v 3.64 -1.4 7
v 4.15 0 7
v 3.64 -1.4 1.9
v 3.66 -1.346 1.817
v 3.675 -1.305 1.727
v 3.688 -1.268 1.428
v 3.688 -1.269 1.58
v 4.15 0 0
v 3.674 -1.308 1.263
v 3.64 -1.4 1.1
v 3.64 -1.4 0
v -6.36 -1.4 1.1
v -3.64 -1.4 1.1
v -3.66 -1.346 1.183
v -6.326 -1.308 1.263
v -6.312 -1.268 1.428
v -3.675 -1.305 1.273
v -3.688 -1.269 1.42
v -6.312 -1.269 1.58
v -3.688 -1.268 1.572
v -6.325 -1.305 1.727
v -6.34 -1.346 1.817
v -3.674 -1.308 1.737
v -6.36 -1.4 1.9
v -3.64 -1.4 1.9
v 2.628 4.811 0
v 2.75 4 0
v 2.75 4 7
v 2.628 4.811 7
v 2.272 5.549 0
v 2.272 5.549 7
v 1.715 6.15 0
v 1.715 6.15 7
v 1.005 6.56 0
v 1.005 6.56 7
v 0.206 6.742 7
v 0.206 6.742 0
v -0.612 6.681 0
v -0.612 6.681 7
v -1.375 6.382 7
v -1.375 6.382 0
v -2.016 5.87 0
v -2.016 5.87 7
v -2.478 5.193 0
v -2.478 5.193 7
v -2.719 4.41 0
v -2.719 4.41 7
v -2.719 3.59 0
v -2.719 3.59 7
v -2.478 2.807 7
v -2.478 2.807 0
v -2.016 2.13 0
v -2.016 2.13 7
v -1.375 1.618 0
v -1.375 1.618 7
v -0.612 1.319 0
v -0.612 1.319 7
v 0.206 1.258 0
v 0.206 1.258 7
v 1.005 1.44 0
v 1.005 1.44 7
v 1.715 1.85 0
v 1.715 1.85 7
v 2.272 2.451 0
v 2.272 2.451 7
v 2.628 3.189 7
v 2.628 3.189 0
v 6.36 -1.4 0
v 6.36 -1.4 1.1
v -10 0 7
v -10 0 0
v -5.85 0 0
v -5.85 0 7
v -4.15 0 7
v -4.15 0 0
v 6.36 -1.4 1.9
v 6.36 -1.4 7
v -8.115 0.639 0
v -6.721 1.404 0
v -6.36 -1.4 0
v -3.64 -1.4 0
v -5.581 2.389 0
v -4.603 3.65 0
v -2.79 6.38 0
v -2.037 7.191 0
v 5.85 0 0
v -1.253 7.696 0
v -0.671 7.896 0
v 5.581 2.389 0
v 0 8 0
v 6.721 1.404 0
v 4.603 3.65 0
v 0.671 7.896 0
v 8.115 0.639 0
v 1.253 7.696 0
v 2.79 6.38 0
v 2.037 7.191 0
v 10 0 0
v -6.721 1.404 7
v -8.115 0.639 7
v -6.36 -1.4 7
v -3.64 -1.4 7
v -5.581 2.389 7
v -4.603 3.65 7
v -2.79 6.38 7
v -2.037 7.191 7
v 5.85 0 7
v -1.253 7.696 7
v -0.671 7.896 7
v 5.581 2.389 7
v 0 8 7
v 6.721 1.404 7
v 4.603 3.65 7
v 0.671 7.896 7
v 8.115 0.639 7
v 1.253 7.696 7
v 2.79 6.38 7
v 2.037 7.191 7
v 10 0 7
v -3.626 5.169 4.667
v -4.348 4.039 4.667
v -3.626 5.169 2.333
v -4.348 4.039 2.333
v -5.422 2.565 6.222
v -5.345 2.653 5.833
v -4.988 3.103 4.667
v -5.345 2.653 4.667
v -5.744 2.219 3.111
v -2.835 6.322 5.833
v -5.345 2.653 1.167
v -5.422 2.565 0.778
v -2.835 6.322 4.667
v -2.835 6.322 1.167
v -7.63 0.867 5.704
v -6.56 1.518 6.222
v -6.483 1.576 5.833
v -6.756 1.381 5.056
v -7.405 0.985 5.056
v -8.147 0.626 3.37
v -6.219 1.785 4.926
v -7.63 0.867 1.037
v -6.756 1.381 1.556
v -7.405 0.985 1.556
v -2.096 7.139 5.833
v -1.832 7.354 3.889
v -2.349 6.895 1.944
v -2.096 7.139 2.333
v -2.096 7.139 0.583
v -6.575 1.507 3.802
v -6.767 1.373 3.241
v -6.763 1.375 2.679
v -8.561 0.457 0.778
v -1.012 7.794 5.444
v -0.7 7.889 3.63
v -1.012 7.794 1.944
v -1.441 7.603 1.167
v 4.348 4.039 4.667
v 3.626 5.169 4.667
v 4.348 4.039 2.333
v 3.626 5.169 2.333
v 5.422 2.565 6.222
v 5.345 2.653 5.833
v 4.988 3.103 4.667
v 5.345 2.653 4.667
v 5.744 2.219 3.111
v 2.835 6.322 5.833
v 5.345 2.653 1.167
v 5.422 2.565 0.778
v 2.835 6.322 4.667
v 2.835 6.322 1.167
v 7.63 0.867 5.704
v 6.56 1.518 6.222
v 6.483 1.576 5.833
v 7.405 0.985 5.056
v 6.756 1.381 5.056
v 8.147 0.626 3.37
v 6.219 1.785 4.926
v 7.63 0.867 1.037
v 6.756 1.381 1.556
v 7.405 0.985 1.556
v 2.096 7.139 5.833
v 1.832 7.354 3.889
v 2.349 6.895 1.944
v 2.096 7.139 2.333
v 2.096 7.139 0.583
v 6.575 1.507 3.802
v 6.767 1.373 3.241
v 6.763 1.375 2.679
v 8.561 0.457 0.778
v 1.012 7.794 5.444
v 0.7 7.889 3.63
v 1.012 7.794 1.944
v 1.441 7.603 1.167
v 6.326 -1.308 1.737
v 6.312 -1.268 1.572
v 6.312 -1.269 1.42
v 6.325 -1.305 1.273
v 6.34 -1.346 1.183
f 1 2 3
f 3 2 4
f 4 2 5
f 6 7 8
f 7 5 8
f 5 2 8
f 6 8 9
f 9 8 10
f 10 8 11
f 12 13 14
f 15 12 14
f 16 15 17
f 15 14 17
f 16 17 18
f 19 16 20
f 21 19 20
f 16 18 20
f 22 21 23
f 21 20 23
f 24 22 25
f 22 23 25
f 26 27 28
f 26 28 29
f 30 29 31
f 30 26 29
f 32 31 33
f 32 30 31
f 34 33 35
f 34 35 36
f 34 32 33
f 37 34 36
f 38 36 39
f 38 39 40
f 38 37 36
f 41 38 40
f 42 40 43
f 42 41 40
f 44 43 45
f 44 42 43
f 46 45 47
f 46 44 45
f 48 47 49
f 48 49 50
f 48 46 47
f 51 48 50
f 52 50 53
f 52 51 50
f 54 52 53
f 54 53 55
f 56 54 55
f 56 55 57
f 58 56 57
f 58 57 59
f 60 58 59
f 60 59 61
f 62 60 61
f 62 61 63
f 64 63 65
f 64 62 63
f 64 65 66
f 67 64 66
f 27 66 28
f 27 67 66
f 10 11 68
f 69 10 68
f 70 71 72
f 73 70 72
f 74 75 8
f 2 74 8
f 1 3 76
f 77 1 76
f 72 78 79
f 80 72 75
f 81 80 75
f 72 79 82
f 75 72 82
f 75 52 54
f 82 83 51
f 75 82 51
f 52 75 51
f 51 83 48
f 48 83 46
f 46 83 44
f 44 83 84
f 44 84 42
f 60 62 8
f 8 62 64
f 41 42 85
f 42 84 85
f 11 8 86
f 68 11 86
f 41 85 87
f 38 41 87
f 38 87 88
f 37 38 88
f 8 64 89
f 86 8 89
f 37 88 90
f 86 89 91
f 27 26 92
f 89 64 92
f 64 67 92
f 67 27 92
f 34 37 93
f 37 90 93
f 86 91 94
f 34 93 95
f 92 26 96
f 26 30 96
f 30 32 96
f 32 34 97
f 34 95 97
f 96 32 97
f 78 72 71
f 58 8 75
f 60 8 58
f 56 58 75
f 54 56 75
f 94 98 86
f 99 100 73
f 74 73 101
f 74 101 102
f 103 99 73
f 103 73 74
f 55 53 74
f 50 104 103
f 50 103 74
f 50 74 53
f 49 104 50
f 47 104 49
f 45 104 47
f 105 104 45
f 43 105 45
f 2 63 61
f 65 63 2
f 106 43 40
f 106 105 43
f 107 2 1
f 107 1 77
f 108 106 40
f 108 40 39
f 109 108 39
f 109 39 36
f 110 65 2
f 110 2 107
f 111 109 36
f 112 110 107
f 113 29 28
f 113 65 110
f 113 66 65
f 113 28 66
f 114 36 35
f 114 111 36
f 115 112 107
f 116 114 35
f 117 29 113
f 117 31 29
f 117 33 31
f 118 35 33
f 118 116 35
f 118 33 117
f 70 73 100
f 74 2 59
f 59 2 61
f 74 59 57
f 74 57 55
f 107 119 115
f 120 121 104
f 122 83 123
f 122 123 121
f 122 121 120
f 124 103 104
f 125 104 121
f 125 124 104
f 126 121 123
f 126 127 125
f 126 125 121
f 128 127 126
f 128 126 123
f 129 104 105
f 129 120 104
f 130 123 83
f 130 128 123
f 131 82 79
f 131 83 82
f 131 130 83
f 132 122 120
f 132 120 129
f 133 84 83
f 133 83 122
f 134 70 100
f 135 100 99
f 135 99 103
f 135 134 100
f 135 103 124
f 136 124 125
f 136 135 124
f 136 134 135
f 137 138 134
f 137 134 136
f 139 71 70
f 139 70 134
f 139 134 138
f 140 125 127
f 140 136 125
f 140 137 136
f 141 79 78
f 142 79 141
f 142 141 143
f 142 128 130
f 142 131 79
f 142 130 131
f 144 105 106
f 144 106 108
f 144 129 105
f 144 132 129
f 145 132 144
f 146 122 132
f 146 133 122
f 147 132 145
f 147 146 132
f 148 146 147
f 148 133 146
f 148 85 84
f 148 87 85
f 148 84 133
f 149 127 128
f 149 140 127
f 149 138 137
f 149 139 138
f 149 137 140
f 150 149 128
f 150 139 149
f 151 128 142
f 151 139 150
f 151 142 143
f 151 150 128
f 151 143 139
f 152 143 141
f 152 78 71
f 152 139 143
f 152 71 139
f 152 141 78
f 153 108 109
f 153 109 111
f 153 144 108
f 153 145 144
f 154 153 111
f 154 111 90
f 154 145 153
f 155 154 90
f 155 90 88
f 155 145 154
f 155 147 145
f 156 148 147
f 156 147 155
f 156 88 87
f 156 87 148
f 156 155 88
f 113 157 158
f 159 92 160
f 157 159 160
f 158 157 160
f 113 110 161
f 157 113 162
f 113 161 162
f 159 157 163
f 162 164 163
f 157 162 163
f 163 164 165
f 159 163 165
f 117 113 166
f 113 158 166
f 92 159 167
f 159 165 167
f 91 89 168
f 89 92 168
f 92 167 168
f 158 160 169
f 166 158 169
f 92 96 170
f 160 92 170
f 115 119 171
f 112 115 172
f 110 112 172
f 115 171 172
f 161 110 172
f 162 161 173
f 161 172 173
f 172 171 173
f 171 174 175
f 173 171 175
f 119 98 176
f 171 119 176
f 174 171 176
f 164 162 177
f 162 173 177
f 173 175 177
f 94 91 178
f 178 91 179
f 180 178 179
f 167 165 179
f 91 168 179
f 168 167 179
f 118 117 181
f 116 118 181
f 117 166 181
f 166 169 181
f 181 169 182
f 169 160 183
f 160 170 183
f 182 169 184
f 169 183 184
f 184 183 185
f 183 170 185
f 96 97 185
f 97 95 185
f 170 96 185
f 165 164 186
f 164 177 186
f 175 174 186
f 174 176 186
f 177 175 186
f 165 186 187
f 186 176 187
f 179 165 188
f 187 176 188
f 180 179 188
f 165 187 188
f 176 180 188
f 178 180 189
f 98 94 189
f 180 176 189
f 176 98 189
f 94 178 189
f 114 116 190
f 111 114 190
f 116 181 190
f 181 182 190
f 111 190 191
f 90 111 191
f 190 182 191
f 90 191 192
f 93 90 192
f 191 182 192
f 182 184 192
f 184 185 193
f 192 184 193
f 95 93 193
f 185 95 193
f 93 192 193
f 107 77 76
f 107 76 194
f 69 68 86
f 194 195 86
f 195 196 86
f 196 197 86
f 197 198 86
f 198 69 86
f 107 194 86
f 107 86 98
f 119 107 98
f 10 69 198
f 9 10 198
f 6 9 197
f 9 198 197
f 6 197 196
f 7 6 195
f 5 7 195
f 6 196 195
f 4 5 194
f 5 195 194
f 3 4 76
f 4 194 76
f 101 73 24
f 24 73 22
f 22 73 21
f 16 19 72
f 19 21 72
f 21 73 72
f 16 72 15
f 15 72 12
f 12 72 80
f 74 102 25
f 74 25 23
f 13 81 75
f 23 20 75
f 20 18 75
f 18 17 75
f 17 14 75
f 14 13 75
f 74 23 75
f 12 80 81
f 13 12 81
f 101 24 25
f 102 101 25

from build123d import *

# Parameters (mm, degrees)
SKETCH_1_R          = 2.75
EXTRUDE_1_DEPTH     = 7
CUT_EXTRUDE_1_DEPTH = 6.5


with BuildPart() as part:
    # 草圖1 → 填料-伸長1 (new body)
    with BuildSketch(Plane.XY):
        with BuildLine():
            Line((-10, 0), (-5.85, 0))
            Line((-5.85, 0), (-6.359558328, -1.4))
            Line((-6.359558328, -1.4), (-3.640441672, -1.4))
            Line((-3.640441672, -1.4), (-4.15, 0))
            Line((-4.15, 0), (4.15, 0))
            Line((4.15, 0), (3.640441672, -1.4))
            Line((3.640441672, -1.4), (6.359558328, -1.4))
            Line((6.359558328, -1.4), (5.85, 0))
            Line((5.85, 0), (10, 0))
            add(Edge.make_bspline(
                [(10, 0), (6.506599927, 0.91468669), (5.142438062, 2.759694825), (2.700884336, 6.654283479), (1.746574016, 7.868913283), (0, 8)],
                knots=[0, 0, 0, 0, 0.426505947, 0.526505947, 1, 1, 1, 1], degree=3))
            add(Edge.make_bspline(
                [(-10, 0), (-6.506599927, 0.91468669), (-5.142438062, 2.759694825), (-2.700884336, 6.654283479), (-1.746574016, 7.868913283), (0, 8)],
                knots=[0, 0, 0, 0, 0.426505947, 0.526505947, 1, 1, 1, 1], degree=3))
        make_face()
        with Locations((0, 4)):
            Circle(SKETCH_1_R, mode=Mode.SUBTRACT)
    extrude(amount=EXTRUDE_1_DEPTH)

    # 草圖2 → 除料-伸長1 (cut, symmetric)
    with BuildSketch(Plane(origin=(0, 0, 0), x_dir=(0, 0, -1), z_dir=(1, 0, 0))):
        with BuildLine():
            Line((-1.9, -1.4), (-1.1, -1.4))
            ThreePointArc((-1.1, -1.4), (-1.5, -1.264313215), (-1.9, -1.4))
        make_face()
    extrude(amount=CUT_EXTRUDE_1_DEPTH, both=True, mode=Mode.SUBTRACT)


solid = part.part
